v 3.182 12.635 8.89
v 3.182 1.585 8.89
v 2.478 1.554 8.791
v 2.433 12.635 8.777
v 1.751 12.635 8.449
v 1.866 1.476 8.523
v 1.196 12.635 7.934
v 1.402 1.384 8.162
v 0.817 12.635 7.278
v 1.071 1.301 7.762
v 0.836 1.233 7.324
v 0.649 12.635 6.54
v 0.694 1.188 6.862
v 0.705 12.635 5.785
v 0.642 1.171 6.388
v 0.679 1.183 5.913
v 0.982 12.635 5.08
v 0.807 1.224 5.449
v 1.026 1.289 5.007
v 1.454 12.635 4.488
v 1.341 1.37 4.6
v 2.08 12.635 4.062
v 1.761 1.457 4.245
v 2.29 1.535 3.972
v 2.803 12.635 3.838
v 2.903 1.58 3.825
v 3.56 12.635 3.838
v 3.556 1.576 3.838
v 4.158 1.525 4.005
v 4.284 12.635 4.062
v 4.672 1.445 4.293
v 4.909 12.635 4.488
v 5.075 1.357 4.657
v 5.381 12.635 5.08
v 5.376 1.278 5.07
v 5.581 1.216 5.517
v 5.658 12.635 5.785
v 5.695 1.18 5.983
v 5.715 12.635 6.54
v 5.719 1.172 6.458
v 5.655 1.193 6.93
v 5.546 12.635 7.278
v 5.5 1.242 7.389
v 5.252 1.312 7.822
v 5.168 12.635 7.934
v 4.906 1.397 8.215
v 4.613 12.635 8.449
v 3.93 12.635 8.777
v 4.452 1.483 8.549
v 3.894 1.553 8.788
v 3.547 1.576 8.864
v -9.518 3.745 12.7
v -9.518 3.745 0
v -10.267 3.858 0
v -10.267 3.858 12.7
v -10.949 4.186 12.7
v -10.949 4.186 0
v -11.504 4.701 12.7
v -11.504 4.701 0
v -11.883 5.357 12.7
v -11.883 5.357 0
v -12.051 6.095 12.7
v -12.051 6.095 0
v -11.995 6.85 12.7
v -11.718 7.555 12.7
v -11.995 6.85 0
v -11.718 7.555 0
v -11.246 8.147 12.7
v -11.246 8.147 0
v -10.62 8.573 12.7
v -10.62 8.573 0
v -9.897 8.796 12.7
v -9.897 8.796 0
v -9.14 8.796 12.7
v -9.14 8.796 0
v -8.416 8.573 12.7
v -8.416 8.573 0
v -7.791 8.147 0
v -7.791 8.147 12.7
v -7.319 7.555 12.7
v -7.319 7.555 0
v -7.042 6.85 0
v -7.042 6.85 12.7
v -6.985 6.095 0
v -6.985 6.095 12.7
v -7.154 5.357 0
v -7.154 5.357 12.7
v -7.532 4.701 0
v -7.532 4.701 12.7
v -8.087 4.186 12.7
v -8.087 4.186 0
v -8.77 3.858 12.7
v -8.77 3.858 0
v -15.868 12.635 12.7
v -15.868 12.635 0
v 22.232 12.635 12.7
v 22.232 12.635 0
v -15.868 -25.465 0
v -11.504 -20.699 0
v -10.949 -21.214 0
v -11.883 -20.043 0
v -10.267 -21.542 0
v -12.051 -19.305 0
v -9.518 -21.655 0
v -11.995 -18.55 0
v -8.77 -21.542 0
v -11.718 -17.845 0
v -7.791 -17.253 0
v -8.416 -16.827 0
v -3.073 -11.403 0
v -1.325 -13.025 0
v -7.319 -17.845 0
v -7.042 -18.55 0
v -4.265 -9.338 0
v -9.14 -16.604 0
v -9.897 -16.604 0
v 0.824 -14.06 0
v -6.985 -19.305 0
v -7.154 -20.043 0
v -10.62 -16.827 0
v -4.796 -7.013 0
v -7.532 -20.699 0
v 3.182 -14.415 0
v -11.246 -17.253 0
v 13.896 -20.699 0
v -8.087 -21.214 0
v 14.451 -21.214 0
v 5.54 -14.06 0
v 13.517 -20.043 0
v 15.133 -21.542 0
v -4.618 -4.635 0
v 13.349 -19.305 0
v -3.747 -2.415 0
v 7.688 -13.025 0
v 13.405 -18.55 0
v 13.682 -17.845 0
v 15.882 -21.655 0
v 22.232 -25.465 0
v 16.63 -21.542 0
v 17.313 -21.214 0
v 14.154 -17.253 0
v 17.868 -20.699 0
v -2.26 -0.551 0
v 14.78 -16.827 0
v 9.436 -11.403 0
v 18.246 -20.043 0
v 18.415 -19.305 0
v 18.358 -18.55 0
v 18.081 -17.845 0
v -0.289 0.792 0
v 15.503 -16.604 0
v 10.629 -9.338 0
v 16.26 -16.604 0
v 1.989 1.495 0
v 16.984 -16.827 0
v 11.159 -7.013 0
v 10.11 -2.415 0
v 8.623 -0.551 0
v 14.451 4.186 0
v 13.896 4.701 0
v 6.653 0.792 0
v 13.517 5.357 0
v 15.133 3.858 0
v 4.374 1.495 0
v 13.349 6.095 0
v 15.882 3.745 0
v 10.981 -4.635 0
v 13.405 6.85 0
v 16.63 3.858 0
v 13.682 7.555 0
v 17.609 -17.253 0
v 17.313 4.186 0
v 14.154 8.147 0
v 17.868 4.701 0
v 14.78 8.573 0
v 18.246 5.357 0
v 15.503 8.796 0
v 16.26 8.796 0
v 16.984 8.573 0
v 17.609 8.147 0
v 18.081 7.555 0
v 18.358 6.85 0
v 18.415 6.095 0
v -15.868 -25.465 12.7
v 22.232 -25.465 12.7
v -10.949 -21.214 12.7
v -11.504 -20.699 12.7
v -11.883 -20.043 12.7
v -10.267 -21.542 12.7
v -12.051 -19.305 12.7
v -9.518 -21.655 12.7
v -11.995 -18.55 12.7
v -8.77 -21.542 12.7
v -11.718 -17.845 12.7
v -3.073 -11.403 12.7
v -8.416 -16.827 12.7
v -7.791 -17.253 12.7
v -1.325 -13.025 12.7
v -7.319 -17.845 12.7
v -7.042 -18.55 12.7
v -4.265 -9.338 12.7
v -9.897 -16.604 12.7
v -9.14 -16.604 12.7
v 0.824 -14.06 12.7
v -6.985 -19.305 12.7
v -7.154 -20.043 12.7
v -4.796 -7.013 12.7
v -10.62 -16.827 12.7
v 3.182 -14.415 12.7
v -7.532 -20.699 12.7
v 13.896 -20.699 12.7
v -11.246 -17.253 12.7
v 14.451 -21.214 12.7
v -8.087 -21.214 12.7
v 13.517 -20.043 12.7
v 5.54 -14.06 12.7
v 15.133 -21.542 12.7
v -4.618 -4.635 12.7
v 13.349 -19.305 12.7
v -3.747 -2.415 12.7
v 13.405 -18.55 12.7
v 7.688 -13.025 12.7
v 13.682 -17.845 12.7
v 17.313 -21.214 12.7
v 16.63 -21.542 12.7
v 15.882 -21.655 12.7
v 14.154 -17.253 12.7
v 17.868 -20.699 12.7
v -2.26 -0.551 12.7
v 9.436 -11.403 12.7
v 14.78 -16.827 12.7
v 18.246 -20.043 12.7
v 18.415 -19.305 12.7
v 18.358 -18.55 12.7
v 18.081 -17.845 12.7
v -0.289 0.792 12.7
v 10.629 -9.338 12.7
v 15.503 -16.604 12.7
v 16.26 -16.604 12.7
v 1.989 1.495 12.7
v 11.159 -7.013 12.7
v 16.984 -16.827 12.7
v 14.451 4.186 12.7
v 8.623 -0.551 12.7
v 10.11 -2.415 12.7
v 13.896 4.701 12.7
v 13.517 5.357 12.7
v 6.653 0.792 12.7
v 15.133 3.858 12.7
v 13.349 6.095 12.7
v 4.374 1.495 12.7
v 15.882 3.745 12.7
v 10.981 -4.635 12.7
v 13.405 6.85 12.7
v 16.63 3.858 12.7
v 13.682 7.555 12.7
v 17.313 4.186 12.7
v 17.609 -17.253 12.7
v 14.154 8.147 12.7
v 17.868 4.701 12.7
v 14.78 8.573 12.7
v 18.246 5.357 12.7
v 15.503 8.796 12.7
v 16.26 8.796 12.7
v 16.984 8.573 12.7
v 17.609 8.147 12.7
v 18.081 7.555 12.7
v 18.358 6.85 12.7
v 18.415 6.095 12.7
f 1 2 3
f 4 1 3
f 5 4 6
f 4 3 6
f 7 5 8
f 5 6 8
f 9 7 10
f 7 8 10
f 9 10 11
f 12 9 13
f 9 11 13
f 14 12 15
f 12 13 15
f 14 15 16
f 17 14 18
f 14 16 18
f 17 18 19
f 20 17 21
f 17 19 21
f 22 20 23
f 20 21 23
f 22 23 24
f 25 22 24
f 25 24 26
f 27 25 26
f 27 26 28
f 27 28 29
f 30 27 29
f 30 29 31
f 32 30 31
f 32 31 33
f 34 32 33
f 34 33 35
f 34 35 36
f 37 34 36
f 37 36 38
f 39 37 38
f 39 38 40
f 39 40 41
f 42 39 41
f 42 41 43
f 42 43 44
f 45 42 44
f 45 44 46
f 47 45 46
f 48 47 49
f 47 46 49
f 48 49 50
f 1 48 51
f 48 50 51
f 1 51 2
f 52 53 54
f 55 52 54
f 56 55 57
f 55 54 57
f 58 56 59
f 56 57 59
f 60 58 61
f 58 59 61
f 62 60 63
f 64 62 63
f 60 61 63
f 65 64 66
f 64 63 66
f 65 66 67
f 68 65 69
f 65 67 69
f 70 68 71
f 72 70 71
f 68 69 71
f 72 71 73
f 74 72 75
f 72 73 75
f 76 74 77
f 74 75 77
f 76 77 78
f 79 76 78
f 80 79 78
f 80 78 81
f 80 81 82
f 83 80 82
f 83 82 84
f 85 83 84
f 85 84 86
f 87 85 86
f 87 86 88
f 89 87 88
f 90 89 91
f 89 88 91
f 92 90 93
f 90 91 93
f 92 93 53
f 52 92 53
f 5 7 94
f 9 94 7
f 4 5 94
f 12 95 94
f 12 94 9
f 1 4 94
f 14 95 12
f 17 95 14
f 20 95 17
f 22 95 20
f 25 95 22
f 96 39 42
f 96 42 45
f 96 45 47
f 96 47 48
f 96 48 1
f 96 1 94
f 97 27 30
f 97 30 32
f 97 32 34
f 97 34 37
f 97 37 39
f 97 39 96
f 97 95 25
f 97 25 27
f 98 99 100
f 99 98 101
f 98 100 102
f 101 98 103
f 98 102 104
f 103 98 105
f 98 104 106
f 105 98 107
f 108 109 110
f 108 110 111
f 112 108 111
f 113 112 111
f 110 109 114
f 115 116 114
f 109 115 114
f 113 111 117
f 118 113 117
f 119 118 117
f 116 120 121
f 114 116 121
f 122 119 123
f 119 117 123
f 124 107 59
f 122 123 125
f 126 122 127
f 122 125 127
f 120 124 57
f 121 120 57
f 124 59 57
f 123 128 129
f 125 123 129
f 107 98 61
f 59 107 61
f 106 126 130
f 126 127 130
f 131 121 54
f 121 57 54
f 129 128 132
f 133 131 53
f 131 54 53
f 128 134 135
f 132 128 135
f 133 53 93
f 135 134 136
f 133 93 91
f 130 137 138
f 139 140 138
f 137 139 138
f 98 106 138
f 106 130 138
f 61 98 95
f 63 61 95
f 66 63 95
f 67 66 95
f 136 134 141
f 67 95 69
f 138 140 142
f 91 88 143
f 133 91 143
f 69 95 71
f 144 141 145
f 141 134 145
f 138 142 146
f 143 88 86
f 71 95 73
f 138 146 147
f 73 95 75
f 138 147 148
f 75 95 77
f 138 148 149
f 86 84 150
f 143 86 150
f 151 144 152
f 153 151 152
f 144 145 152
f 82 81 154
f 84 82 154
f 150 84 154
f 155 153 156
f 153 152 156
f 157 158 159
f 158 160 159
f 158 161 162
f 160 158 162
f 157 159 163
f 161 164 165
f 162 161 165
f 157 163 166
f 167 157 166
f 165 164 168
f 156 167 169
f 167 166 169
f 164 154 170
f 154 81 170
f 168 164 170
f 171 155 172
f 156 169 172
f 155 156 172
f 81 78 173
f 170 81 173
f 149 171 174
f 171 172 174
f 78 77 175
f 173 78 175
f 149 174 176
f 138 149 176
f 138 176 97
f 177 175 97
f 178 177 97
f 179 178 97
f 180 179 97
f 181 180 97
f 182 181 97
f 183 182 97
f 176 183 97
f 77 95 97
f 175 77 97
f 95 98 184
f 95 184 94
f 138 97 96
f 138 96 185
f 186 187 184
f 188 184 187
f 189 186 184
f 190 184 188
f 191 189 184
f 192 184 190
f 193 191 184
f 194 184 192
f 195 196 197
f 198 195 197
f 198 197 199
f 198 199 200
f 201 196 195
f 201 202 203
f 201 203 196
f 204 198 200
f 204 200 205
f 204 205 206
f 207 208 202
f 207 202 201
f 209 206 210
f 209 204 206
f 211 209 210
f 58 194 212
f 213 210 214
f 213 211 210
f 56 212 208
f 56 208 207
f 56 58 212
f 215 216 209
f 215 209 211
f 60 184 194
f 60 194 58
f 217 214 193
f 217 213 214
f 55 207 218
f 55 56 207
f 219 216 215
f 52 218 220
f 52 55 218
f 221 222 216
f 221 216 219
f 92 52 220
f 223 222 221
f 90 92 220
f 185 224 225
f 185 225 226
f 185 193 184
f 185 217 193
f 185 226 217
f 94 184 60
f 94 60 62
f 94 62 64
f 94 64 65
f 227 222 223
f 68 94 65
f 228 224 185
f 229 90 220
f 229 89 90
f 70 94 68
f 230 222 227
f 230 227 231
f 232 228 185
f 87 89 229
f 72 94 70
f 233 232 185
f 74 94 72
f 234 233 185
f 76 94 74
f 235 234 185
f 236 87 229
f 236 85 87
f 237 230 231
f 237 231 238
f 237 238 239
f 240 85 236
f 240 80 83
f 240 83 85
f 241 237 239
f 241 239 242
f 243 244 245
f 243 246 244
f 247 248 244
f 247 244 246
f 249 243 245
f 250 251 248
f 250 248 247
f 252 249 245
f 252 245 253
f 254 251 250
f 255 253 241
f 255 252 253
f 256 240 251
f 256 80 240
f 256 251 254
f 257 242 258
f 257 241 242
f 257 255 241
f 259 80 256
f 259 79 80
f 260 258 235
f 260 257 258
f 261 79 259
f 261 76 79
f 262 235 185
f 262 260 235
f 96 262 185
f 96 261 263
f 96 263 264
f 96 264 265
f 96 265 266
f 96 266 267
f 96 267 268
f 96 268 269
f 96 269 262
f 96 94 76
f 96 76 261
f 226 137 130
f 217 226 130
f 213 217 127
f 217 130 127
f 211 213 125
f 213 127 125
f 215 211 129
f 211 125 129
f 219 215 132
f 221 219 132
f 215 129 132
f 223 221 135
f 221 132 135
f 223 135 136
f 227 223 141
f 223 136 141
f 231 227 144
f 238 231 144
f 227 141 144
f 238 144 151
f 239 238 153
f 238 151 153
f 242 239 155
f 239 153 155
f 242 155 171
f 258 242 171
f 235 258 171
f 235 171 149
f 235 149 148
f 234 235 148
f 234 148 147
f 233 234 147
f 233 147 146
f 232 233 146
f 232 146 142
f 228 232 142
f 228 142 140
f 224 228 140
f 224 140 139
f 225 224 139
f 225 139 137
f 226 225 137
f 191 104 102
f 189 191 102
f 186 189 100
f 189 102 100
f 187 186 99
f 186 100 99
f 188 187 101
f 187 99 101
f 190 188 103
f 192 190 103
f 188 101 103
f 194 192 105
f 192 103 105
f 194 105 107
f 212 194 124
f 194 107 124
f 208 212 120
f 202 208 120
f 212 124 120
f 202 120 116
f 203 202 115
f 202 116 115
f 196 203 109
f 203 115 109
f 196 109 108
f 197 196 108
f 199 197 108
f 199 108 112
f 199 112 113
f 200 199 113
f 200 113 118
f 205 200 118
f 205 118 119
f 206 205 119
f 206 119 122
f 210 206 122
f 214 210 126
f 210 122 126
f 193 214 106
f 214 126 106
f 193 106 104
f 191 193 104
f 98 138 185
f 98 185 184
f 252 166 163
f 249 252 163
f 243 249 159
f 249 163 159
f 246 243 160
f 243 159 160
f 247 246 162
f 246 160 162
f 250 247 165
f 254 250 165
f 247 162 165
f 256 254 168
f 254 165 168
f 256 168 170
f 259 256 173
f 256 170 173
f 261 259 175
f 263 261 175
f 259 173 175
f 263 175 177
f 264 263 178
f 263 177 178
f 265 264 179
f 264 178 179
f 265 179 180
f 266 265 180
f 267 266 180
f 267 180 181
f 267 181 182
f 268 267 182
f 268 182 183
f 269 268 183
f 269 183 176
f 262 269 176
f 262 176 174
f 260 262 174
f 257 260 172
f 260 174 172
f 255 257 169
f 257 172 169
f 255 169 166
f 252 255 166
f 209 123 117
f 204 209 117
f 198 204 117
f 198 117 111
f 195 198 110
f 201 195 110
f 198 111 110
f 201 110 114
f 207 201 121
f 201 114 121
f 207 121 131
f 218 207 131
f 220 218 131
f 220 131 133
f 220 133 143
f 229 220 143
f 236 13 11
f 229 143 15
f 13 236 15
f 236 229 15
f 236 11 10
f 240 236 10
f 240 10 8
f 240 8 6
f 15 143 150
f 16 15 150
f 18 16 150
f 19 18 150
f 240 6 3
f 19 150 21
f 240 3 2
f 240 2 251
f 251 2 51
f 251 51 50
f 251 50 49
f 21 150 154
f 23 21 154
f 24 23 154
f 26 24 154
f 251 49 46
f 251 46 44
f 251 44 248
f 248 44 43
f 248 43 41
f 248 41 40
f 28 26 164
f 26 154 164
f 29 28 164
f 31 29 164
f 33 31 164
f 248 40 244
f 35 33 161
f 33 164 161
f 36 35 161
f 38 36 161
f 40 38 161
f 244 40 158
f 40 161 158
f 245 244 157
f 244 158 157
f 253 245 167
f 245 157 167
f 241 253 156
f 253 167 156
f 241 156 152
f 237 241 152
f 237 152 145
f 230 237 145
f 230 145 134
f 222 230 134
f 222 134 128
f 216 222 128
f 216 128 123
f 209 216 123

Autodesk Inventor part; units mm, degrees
ref_plane "YZ Plane" through (0, 0, 0) normal (1, 0, 0) x (0, 1, 0)
ref_plane "XZ Plane" through (0, 0, 0) normal (0, 1, 0) x (-1, 0, 0)
ref_plane "XY Plane" through (0, 0, 0) normal (0, 0, 1) x (1, 0, 0)
sketch "Sketch1" plane through (0, 0, 0) normal (0, 0, 1) x (1, 0, 0)
  line L0 (-15.8683, 12.6347) -> (22.2317, 12.6347)
  line L1 (22.2317, 12.6347) -> (22.2317, -25.4653)
  line L2 (22.2317, -25.4653) -> (-15.8683, -25.4653)
  line L3 (-15.8683, -25.4653) -> (-15.8683, 12.6347)
  point P0 (0, 0)
  dimension "d0" = 38.1
  dimension "d1" = 38.1
extrude "Extrusion1" add sketch "Sketch1" along normal blind 12.7
hole "Hole1" at (3.1817, -6.4153, 12.7) direction (0, 0, -1) diameter 16 end through all
hole "Hole2" at (-9.5183, 6.2847, 12.7) direction (0, 0, -1) diameter 5.08 end through all
hole "Hole3" at (15.8817, 6.2847, 12.7) direction (0, 0, -1) diameter 5.08 end through all
hole "Hole4" at (-9.5183, -19.1153, 12.7) direction (0, 0, -1) diameter 5.08 end through all
hole "Hole5" at (15.8817, -19.1153, 12.7) direction (0, 0, -1) diameter 5.08 end through all
hole "Hole6" at (3.1817, 12.6347, 6.35) direction (0, -1, 0) diameter 5.08 depth 12.7 tip angle 118
sketch "Sketch2" plane through (0, 0, 12.7) normal (0, 0, 1) x (1, 0, 0)
  circle A0 centre (15.8817, -19.1153) radius 2.54 projected
  circle A1 centre (-9.5183, -19.1153) radius 2.54 projected
  circle A2 centre (15.8817, 6.2847) radius 2.54 projected
  circle A3 centre (-9.5183, 6.2847) radius 2.54 projected
  circle A4 centre (3.1817, -6.4153) radius 8 projected
  line L0 (22.2317, 12.6347) -> (22.2317, -25.4653) projected
  line L1 (-15.8683, 12.6347) -> (22.2317, 12.6347) projected
  line L2 (-15.8683, -25.4653) -> (-15.8683, 12.6347) projected
  line L3 (22.2317, -25.4653) -> (-15.8683, -25.4653) projected
  point P0 (0, 0)
  dimension "d58" = 6.35
  dimension "d59" = 6.35
  dimension "d60" = 19.05
  dimension "d61" = 19.05
  dimension "d64" = 16
  dimension "d65" = 12.7
  dimension "d66" = 12.7
  dimension "d67" = 12.7
sketch "Sketch3" plane through (-15.8683, 12.6347, 0) normal (0, 1, 0) x (1, 0, 0)
  circle A0 centre (19.05, -6.35) radius 2.54 projected
  line L0 (0, -12.7) -> (38.1, -12.7) projected
  line L1 (38.1, 0) -> (38.1, -12.7) projected
  line L2 (0, 0) -> (38.1, 0) projected
  line L3 (0, 0) -> (0, -12.7) projected
  point P0 (15.8683, 0)
  dimension "d62" = 6.35
  dimension "d63" = 19.05
properties part number "alignmentplate"
